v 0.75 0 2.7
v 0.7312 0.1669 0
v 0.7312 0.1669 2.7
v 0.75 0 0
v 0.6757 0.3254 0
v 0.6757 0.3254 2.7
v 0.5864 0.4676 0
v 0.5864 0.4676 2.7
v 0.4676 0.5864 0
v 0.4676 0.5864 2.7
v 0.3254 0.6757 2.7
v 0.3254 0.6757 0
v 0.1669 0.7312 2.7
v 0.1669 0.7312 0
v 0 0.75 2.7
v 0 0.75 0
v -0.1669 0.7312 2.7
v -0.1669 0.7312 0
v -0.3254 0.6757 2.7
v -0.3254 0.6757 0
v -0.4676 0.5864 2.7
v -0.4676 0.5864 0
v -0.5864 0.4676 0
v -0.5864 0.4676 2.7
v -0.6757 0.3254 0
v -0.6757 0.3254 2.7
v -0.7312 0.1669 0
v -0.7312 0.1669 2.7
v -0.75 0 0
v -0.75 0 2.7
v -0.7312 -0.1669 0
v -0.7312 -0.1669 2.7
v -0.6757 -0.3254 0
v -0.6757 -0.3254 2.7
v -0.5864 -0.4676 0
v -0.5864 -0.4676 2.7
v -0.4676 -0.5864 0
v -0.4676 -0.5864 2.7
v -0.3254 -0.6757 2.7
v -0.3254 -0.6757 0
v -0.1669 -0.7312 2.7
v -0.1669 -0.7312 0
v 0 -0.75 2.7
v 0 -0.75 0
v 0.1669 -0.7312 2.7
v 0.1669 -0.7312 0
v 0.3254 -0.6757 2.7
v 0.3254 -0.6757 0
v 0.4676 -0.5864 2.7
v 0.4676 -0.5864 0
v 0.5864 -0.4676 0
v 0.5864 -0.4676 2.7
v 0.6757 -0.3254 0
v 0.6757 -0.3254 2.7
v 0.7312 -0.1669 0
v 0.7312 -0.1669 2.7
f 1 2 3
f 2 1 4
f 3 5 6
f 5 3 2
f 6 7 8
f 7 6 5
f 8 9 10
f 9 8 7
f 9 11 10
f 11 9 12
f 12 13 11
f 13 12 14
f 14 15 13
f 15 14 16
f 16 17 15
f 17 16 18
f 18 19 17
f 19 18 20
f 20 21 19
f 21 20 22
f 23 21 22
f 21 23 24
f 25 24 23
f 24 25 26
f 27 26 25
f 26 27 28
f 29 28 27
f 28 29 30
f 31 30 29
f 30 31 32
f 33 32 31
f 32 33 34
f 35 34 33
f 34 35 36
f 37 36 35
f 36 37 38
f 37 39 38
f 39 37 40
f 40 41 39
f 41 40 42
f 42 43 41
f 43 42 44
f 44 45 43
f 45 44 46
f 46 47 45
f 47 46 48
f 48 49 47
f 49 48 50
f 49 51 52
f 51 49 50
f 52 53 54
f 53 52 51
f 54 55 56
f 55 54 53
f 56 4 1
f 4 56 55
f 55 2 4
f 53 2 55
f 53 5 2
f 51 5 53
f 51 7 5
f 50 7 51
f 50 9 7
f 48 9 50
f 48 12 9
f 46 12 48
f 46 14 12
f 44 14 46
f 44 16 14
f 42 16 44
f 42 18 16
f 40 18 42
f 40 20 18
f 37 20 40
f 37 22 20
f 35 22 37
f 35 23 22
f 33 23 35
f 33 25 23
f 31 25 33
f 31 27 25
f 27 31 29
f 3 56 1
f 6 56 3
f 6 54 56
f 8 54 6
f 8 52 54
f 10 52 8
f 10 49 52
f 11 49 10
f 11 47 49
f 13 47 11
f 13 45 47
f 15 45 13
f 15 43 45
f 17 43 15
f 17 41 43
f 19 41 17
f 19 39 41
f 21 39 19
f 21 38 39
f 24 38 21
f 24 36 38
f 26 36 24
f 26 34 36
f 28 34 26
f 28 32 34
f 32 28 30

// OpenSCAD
// part_id: jup9
// name: Jupiter rivet pin
// source_drawing_ids: DRW-012
// units: mm
// revision: 0.1
// SPDX-License-Identifier: MIT

module part_jup9(pin_d = 1.5, pin_h = 2.7) {
    cylinder(d = pin_d, h = pin_h, center = false, $fn = 28);
}

// ---- "main guard" ----
// Default to previewing when opened directly:
if (is_undef(__LIB_MODE__)) {
    part_jup9();
}
